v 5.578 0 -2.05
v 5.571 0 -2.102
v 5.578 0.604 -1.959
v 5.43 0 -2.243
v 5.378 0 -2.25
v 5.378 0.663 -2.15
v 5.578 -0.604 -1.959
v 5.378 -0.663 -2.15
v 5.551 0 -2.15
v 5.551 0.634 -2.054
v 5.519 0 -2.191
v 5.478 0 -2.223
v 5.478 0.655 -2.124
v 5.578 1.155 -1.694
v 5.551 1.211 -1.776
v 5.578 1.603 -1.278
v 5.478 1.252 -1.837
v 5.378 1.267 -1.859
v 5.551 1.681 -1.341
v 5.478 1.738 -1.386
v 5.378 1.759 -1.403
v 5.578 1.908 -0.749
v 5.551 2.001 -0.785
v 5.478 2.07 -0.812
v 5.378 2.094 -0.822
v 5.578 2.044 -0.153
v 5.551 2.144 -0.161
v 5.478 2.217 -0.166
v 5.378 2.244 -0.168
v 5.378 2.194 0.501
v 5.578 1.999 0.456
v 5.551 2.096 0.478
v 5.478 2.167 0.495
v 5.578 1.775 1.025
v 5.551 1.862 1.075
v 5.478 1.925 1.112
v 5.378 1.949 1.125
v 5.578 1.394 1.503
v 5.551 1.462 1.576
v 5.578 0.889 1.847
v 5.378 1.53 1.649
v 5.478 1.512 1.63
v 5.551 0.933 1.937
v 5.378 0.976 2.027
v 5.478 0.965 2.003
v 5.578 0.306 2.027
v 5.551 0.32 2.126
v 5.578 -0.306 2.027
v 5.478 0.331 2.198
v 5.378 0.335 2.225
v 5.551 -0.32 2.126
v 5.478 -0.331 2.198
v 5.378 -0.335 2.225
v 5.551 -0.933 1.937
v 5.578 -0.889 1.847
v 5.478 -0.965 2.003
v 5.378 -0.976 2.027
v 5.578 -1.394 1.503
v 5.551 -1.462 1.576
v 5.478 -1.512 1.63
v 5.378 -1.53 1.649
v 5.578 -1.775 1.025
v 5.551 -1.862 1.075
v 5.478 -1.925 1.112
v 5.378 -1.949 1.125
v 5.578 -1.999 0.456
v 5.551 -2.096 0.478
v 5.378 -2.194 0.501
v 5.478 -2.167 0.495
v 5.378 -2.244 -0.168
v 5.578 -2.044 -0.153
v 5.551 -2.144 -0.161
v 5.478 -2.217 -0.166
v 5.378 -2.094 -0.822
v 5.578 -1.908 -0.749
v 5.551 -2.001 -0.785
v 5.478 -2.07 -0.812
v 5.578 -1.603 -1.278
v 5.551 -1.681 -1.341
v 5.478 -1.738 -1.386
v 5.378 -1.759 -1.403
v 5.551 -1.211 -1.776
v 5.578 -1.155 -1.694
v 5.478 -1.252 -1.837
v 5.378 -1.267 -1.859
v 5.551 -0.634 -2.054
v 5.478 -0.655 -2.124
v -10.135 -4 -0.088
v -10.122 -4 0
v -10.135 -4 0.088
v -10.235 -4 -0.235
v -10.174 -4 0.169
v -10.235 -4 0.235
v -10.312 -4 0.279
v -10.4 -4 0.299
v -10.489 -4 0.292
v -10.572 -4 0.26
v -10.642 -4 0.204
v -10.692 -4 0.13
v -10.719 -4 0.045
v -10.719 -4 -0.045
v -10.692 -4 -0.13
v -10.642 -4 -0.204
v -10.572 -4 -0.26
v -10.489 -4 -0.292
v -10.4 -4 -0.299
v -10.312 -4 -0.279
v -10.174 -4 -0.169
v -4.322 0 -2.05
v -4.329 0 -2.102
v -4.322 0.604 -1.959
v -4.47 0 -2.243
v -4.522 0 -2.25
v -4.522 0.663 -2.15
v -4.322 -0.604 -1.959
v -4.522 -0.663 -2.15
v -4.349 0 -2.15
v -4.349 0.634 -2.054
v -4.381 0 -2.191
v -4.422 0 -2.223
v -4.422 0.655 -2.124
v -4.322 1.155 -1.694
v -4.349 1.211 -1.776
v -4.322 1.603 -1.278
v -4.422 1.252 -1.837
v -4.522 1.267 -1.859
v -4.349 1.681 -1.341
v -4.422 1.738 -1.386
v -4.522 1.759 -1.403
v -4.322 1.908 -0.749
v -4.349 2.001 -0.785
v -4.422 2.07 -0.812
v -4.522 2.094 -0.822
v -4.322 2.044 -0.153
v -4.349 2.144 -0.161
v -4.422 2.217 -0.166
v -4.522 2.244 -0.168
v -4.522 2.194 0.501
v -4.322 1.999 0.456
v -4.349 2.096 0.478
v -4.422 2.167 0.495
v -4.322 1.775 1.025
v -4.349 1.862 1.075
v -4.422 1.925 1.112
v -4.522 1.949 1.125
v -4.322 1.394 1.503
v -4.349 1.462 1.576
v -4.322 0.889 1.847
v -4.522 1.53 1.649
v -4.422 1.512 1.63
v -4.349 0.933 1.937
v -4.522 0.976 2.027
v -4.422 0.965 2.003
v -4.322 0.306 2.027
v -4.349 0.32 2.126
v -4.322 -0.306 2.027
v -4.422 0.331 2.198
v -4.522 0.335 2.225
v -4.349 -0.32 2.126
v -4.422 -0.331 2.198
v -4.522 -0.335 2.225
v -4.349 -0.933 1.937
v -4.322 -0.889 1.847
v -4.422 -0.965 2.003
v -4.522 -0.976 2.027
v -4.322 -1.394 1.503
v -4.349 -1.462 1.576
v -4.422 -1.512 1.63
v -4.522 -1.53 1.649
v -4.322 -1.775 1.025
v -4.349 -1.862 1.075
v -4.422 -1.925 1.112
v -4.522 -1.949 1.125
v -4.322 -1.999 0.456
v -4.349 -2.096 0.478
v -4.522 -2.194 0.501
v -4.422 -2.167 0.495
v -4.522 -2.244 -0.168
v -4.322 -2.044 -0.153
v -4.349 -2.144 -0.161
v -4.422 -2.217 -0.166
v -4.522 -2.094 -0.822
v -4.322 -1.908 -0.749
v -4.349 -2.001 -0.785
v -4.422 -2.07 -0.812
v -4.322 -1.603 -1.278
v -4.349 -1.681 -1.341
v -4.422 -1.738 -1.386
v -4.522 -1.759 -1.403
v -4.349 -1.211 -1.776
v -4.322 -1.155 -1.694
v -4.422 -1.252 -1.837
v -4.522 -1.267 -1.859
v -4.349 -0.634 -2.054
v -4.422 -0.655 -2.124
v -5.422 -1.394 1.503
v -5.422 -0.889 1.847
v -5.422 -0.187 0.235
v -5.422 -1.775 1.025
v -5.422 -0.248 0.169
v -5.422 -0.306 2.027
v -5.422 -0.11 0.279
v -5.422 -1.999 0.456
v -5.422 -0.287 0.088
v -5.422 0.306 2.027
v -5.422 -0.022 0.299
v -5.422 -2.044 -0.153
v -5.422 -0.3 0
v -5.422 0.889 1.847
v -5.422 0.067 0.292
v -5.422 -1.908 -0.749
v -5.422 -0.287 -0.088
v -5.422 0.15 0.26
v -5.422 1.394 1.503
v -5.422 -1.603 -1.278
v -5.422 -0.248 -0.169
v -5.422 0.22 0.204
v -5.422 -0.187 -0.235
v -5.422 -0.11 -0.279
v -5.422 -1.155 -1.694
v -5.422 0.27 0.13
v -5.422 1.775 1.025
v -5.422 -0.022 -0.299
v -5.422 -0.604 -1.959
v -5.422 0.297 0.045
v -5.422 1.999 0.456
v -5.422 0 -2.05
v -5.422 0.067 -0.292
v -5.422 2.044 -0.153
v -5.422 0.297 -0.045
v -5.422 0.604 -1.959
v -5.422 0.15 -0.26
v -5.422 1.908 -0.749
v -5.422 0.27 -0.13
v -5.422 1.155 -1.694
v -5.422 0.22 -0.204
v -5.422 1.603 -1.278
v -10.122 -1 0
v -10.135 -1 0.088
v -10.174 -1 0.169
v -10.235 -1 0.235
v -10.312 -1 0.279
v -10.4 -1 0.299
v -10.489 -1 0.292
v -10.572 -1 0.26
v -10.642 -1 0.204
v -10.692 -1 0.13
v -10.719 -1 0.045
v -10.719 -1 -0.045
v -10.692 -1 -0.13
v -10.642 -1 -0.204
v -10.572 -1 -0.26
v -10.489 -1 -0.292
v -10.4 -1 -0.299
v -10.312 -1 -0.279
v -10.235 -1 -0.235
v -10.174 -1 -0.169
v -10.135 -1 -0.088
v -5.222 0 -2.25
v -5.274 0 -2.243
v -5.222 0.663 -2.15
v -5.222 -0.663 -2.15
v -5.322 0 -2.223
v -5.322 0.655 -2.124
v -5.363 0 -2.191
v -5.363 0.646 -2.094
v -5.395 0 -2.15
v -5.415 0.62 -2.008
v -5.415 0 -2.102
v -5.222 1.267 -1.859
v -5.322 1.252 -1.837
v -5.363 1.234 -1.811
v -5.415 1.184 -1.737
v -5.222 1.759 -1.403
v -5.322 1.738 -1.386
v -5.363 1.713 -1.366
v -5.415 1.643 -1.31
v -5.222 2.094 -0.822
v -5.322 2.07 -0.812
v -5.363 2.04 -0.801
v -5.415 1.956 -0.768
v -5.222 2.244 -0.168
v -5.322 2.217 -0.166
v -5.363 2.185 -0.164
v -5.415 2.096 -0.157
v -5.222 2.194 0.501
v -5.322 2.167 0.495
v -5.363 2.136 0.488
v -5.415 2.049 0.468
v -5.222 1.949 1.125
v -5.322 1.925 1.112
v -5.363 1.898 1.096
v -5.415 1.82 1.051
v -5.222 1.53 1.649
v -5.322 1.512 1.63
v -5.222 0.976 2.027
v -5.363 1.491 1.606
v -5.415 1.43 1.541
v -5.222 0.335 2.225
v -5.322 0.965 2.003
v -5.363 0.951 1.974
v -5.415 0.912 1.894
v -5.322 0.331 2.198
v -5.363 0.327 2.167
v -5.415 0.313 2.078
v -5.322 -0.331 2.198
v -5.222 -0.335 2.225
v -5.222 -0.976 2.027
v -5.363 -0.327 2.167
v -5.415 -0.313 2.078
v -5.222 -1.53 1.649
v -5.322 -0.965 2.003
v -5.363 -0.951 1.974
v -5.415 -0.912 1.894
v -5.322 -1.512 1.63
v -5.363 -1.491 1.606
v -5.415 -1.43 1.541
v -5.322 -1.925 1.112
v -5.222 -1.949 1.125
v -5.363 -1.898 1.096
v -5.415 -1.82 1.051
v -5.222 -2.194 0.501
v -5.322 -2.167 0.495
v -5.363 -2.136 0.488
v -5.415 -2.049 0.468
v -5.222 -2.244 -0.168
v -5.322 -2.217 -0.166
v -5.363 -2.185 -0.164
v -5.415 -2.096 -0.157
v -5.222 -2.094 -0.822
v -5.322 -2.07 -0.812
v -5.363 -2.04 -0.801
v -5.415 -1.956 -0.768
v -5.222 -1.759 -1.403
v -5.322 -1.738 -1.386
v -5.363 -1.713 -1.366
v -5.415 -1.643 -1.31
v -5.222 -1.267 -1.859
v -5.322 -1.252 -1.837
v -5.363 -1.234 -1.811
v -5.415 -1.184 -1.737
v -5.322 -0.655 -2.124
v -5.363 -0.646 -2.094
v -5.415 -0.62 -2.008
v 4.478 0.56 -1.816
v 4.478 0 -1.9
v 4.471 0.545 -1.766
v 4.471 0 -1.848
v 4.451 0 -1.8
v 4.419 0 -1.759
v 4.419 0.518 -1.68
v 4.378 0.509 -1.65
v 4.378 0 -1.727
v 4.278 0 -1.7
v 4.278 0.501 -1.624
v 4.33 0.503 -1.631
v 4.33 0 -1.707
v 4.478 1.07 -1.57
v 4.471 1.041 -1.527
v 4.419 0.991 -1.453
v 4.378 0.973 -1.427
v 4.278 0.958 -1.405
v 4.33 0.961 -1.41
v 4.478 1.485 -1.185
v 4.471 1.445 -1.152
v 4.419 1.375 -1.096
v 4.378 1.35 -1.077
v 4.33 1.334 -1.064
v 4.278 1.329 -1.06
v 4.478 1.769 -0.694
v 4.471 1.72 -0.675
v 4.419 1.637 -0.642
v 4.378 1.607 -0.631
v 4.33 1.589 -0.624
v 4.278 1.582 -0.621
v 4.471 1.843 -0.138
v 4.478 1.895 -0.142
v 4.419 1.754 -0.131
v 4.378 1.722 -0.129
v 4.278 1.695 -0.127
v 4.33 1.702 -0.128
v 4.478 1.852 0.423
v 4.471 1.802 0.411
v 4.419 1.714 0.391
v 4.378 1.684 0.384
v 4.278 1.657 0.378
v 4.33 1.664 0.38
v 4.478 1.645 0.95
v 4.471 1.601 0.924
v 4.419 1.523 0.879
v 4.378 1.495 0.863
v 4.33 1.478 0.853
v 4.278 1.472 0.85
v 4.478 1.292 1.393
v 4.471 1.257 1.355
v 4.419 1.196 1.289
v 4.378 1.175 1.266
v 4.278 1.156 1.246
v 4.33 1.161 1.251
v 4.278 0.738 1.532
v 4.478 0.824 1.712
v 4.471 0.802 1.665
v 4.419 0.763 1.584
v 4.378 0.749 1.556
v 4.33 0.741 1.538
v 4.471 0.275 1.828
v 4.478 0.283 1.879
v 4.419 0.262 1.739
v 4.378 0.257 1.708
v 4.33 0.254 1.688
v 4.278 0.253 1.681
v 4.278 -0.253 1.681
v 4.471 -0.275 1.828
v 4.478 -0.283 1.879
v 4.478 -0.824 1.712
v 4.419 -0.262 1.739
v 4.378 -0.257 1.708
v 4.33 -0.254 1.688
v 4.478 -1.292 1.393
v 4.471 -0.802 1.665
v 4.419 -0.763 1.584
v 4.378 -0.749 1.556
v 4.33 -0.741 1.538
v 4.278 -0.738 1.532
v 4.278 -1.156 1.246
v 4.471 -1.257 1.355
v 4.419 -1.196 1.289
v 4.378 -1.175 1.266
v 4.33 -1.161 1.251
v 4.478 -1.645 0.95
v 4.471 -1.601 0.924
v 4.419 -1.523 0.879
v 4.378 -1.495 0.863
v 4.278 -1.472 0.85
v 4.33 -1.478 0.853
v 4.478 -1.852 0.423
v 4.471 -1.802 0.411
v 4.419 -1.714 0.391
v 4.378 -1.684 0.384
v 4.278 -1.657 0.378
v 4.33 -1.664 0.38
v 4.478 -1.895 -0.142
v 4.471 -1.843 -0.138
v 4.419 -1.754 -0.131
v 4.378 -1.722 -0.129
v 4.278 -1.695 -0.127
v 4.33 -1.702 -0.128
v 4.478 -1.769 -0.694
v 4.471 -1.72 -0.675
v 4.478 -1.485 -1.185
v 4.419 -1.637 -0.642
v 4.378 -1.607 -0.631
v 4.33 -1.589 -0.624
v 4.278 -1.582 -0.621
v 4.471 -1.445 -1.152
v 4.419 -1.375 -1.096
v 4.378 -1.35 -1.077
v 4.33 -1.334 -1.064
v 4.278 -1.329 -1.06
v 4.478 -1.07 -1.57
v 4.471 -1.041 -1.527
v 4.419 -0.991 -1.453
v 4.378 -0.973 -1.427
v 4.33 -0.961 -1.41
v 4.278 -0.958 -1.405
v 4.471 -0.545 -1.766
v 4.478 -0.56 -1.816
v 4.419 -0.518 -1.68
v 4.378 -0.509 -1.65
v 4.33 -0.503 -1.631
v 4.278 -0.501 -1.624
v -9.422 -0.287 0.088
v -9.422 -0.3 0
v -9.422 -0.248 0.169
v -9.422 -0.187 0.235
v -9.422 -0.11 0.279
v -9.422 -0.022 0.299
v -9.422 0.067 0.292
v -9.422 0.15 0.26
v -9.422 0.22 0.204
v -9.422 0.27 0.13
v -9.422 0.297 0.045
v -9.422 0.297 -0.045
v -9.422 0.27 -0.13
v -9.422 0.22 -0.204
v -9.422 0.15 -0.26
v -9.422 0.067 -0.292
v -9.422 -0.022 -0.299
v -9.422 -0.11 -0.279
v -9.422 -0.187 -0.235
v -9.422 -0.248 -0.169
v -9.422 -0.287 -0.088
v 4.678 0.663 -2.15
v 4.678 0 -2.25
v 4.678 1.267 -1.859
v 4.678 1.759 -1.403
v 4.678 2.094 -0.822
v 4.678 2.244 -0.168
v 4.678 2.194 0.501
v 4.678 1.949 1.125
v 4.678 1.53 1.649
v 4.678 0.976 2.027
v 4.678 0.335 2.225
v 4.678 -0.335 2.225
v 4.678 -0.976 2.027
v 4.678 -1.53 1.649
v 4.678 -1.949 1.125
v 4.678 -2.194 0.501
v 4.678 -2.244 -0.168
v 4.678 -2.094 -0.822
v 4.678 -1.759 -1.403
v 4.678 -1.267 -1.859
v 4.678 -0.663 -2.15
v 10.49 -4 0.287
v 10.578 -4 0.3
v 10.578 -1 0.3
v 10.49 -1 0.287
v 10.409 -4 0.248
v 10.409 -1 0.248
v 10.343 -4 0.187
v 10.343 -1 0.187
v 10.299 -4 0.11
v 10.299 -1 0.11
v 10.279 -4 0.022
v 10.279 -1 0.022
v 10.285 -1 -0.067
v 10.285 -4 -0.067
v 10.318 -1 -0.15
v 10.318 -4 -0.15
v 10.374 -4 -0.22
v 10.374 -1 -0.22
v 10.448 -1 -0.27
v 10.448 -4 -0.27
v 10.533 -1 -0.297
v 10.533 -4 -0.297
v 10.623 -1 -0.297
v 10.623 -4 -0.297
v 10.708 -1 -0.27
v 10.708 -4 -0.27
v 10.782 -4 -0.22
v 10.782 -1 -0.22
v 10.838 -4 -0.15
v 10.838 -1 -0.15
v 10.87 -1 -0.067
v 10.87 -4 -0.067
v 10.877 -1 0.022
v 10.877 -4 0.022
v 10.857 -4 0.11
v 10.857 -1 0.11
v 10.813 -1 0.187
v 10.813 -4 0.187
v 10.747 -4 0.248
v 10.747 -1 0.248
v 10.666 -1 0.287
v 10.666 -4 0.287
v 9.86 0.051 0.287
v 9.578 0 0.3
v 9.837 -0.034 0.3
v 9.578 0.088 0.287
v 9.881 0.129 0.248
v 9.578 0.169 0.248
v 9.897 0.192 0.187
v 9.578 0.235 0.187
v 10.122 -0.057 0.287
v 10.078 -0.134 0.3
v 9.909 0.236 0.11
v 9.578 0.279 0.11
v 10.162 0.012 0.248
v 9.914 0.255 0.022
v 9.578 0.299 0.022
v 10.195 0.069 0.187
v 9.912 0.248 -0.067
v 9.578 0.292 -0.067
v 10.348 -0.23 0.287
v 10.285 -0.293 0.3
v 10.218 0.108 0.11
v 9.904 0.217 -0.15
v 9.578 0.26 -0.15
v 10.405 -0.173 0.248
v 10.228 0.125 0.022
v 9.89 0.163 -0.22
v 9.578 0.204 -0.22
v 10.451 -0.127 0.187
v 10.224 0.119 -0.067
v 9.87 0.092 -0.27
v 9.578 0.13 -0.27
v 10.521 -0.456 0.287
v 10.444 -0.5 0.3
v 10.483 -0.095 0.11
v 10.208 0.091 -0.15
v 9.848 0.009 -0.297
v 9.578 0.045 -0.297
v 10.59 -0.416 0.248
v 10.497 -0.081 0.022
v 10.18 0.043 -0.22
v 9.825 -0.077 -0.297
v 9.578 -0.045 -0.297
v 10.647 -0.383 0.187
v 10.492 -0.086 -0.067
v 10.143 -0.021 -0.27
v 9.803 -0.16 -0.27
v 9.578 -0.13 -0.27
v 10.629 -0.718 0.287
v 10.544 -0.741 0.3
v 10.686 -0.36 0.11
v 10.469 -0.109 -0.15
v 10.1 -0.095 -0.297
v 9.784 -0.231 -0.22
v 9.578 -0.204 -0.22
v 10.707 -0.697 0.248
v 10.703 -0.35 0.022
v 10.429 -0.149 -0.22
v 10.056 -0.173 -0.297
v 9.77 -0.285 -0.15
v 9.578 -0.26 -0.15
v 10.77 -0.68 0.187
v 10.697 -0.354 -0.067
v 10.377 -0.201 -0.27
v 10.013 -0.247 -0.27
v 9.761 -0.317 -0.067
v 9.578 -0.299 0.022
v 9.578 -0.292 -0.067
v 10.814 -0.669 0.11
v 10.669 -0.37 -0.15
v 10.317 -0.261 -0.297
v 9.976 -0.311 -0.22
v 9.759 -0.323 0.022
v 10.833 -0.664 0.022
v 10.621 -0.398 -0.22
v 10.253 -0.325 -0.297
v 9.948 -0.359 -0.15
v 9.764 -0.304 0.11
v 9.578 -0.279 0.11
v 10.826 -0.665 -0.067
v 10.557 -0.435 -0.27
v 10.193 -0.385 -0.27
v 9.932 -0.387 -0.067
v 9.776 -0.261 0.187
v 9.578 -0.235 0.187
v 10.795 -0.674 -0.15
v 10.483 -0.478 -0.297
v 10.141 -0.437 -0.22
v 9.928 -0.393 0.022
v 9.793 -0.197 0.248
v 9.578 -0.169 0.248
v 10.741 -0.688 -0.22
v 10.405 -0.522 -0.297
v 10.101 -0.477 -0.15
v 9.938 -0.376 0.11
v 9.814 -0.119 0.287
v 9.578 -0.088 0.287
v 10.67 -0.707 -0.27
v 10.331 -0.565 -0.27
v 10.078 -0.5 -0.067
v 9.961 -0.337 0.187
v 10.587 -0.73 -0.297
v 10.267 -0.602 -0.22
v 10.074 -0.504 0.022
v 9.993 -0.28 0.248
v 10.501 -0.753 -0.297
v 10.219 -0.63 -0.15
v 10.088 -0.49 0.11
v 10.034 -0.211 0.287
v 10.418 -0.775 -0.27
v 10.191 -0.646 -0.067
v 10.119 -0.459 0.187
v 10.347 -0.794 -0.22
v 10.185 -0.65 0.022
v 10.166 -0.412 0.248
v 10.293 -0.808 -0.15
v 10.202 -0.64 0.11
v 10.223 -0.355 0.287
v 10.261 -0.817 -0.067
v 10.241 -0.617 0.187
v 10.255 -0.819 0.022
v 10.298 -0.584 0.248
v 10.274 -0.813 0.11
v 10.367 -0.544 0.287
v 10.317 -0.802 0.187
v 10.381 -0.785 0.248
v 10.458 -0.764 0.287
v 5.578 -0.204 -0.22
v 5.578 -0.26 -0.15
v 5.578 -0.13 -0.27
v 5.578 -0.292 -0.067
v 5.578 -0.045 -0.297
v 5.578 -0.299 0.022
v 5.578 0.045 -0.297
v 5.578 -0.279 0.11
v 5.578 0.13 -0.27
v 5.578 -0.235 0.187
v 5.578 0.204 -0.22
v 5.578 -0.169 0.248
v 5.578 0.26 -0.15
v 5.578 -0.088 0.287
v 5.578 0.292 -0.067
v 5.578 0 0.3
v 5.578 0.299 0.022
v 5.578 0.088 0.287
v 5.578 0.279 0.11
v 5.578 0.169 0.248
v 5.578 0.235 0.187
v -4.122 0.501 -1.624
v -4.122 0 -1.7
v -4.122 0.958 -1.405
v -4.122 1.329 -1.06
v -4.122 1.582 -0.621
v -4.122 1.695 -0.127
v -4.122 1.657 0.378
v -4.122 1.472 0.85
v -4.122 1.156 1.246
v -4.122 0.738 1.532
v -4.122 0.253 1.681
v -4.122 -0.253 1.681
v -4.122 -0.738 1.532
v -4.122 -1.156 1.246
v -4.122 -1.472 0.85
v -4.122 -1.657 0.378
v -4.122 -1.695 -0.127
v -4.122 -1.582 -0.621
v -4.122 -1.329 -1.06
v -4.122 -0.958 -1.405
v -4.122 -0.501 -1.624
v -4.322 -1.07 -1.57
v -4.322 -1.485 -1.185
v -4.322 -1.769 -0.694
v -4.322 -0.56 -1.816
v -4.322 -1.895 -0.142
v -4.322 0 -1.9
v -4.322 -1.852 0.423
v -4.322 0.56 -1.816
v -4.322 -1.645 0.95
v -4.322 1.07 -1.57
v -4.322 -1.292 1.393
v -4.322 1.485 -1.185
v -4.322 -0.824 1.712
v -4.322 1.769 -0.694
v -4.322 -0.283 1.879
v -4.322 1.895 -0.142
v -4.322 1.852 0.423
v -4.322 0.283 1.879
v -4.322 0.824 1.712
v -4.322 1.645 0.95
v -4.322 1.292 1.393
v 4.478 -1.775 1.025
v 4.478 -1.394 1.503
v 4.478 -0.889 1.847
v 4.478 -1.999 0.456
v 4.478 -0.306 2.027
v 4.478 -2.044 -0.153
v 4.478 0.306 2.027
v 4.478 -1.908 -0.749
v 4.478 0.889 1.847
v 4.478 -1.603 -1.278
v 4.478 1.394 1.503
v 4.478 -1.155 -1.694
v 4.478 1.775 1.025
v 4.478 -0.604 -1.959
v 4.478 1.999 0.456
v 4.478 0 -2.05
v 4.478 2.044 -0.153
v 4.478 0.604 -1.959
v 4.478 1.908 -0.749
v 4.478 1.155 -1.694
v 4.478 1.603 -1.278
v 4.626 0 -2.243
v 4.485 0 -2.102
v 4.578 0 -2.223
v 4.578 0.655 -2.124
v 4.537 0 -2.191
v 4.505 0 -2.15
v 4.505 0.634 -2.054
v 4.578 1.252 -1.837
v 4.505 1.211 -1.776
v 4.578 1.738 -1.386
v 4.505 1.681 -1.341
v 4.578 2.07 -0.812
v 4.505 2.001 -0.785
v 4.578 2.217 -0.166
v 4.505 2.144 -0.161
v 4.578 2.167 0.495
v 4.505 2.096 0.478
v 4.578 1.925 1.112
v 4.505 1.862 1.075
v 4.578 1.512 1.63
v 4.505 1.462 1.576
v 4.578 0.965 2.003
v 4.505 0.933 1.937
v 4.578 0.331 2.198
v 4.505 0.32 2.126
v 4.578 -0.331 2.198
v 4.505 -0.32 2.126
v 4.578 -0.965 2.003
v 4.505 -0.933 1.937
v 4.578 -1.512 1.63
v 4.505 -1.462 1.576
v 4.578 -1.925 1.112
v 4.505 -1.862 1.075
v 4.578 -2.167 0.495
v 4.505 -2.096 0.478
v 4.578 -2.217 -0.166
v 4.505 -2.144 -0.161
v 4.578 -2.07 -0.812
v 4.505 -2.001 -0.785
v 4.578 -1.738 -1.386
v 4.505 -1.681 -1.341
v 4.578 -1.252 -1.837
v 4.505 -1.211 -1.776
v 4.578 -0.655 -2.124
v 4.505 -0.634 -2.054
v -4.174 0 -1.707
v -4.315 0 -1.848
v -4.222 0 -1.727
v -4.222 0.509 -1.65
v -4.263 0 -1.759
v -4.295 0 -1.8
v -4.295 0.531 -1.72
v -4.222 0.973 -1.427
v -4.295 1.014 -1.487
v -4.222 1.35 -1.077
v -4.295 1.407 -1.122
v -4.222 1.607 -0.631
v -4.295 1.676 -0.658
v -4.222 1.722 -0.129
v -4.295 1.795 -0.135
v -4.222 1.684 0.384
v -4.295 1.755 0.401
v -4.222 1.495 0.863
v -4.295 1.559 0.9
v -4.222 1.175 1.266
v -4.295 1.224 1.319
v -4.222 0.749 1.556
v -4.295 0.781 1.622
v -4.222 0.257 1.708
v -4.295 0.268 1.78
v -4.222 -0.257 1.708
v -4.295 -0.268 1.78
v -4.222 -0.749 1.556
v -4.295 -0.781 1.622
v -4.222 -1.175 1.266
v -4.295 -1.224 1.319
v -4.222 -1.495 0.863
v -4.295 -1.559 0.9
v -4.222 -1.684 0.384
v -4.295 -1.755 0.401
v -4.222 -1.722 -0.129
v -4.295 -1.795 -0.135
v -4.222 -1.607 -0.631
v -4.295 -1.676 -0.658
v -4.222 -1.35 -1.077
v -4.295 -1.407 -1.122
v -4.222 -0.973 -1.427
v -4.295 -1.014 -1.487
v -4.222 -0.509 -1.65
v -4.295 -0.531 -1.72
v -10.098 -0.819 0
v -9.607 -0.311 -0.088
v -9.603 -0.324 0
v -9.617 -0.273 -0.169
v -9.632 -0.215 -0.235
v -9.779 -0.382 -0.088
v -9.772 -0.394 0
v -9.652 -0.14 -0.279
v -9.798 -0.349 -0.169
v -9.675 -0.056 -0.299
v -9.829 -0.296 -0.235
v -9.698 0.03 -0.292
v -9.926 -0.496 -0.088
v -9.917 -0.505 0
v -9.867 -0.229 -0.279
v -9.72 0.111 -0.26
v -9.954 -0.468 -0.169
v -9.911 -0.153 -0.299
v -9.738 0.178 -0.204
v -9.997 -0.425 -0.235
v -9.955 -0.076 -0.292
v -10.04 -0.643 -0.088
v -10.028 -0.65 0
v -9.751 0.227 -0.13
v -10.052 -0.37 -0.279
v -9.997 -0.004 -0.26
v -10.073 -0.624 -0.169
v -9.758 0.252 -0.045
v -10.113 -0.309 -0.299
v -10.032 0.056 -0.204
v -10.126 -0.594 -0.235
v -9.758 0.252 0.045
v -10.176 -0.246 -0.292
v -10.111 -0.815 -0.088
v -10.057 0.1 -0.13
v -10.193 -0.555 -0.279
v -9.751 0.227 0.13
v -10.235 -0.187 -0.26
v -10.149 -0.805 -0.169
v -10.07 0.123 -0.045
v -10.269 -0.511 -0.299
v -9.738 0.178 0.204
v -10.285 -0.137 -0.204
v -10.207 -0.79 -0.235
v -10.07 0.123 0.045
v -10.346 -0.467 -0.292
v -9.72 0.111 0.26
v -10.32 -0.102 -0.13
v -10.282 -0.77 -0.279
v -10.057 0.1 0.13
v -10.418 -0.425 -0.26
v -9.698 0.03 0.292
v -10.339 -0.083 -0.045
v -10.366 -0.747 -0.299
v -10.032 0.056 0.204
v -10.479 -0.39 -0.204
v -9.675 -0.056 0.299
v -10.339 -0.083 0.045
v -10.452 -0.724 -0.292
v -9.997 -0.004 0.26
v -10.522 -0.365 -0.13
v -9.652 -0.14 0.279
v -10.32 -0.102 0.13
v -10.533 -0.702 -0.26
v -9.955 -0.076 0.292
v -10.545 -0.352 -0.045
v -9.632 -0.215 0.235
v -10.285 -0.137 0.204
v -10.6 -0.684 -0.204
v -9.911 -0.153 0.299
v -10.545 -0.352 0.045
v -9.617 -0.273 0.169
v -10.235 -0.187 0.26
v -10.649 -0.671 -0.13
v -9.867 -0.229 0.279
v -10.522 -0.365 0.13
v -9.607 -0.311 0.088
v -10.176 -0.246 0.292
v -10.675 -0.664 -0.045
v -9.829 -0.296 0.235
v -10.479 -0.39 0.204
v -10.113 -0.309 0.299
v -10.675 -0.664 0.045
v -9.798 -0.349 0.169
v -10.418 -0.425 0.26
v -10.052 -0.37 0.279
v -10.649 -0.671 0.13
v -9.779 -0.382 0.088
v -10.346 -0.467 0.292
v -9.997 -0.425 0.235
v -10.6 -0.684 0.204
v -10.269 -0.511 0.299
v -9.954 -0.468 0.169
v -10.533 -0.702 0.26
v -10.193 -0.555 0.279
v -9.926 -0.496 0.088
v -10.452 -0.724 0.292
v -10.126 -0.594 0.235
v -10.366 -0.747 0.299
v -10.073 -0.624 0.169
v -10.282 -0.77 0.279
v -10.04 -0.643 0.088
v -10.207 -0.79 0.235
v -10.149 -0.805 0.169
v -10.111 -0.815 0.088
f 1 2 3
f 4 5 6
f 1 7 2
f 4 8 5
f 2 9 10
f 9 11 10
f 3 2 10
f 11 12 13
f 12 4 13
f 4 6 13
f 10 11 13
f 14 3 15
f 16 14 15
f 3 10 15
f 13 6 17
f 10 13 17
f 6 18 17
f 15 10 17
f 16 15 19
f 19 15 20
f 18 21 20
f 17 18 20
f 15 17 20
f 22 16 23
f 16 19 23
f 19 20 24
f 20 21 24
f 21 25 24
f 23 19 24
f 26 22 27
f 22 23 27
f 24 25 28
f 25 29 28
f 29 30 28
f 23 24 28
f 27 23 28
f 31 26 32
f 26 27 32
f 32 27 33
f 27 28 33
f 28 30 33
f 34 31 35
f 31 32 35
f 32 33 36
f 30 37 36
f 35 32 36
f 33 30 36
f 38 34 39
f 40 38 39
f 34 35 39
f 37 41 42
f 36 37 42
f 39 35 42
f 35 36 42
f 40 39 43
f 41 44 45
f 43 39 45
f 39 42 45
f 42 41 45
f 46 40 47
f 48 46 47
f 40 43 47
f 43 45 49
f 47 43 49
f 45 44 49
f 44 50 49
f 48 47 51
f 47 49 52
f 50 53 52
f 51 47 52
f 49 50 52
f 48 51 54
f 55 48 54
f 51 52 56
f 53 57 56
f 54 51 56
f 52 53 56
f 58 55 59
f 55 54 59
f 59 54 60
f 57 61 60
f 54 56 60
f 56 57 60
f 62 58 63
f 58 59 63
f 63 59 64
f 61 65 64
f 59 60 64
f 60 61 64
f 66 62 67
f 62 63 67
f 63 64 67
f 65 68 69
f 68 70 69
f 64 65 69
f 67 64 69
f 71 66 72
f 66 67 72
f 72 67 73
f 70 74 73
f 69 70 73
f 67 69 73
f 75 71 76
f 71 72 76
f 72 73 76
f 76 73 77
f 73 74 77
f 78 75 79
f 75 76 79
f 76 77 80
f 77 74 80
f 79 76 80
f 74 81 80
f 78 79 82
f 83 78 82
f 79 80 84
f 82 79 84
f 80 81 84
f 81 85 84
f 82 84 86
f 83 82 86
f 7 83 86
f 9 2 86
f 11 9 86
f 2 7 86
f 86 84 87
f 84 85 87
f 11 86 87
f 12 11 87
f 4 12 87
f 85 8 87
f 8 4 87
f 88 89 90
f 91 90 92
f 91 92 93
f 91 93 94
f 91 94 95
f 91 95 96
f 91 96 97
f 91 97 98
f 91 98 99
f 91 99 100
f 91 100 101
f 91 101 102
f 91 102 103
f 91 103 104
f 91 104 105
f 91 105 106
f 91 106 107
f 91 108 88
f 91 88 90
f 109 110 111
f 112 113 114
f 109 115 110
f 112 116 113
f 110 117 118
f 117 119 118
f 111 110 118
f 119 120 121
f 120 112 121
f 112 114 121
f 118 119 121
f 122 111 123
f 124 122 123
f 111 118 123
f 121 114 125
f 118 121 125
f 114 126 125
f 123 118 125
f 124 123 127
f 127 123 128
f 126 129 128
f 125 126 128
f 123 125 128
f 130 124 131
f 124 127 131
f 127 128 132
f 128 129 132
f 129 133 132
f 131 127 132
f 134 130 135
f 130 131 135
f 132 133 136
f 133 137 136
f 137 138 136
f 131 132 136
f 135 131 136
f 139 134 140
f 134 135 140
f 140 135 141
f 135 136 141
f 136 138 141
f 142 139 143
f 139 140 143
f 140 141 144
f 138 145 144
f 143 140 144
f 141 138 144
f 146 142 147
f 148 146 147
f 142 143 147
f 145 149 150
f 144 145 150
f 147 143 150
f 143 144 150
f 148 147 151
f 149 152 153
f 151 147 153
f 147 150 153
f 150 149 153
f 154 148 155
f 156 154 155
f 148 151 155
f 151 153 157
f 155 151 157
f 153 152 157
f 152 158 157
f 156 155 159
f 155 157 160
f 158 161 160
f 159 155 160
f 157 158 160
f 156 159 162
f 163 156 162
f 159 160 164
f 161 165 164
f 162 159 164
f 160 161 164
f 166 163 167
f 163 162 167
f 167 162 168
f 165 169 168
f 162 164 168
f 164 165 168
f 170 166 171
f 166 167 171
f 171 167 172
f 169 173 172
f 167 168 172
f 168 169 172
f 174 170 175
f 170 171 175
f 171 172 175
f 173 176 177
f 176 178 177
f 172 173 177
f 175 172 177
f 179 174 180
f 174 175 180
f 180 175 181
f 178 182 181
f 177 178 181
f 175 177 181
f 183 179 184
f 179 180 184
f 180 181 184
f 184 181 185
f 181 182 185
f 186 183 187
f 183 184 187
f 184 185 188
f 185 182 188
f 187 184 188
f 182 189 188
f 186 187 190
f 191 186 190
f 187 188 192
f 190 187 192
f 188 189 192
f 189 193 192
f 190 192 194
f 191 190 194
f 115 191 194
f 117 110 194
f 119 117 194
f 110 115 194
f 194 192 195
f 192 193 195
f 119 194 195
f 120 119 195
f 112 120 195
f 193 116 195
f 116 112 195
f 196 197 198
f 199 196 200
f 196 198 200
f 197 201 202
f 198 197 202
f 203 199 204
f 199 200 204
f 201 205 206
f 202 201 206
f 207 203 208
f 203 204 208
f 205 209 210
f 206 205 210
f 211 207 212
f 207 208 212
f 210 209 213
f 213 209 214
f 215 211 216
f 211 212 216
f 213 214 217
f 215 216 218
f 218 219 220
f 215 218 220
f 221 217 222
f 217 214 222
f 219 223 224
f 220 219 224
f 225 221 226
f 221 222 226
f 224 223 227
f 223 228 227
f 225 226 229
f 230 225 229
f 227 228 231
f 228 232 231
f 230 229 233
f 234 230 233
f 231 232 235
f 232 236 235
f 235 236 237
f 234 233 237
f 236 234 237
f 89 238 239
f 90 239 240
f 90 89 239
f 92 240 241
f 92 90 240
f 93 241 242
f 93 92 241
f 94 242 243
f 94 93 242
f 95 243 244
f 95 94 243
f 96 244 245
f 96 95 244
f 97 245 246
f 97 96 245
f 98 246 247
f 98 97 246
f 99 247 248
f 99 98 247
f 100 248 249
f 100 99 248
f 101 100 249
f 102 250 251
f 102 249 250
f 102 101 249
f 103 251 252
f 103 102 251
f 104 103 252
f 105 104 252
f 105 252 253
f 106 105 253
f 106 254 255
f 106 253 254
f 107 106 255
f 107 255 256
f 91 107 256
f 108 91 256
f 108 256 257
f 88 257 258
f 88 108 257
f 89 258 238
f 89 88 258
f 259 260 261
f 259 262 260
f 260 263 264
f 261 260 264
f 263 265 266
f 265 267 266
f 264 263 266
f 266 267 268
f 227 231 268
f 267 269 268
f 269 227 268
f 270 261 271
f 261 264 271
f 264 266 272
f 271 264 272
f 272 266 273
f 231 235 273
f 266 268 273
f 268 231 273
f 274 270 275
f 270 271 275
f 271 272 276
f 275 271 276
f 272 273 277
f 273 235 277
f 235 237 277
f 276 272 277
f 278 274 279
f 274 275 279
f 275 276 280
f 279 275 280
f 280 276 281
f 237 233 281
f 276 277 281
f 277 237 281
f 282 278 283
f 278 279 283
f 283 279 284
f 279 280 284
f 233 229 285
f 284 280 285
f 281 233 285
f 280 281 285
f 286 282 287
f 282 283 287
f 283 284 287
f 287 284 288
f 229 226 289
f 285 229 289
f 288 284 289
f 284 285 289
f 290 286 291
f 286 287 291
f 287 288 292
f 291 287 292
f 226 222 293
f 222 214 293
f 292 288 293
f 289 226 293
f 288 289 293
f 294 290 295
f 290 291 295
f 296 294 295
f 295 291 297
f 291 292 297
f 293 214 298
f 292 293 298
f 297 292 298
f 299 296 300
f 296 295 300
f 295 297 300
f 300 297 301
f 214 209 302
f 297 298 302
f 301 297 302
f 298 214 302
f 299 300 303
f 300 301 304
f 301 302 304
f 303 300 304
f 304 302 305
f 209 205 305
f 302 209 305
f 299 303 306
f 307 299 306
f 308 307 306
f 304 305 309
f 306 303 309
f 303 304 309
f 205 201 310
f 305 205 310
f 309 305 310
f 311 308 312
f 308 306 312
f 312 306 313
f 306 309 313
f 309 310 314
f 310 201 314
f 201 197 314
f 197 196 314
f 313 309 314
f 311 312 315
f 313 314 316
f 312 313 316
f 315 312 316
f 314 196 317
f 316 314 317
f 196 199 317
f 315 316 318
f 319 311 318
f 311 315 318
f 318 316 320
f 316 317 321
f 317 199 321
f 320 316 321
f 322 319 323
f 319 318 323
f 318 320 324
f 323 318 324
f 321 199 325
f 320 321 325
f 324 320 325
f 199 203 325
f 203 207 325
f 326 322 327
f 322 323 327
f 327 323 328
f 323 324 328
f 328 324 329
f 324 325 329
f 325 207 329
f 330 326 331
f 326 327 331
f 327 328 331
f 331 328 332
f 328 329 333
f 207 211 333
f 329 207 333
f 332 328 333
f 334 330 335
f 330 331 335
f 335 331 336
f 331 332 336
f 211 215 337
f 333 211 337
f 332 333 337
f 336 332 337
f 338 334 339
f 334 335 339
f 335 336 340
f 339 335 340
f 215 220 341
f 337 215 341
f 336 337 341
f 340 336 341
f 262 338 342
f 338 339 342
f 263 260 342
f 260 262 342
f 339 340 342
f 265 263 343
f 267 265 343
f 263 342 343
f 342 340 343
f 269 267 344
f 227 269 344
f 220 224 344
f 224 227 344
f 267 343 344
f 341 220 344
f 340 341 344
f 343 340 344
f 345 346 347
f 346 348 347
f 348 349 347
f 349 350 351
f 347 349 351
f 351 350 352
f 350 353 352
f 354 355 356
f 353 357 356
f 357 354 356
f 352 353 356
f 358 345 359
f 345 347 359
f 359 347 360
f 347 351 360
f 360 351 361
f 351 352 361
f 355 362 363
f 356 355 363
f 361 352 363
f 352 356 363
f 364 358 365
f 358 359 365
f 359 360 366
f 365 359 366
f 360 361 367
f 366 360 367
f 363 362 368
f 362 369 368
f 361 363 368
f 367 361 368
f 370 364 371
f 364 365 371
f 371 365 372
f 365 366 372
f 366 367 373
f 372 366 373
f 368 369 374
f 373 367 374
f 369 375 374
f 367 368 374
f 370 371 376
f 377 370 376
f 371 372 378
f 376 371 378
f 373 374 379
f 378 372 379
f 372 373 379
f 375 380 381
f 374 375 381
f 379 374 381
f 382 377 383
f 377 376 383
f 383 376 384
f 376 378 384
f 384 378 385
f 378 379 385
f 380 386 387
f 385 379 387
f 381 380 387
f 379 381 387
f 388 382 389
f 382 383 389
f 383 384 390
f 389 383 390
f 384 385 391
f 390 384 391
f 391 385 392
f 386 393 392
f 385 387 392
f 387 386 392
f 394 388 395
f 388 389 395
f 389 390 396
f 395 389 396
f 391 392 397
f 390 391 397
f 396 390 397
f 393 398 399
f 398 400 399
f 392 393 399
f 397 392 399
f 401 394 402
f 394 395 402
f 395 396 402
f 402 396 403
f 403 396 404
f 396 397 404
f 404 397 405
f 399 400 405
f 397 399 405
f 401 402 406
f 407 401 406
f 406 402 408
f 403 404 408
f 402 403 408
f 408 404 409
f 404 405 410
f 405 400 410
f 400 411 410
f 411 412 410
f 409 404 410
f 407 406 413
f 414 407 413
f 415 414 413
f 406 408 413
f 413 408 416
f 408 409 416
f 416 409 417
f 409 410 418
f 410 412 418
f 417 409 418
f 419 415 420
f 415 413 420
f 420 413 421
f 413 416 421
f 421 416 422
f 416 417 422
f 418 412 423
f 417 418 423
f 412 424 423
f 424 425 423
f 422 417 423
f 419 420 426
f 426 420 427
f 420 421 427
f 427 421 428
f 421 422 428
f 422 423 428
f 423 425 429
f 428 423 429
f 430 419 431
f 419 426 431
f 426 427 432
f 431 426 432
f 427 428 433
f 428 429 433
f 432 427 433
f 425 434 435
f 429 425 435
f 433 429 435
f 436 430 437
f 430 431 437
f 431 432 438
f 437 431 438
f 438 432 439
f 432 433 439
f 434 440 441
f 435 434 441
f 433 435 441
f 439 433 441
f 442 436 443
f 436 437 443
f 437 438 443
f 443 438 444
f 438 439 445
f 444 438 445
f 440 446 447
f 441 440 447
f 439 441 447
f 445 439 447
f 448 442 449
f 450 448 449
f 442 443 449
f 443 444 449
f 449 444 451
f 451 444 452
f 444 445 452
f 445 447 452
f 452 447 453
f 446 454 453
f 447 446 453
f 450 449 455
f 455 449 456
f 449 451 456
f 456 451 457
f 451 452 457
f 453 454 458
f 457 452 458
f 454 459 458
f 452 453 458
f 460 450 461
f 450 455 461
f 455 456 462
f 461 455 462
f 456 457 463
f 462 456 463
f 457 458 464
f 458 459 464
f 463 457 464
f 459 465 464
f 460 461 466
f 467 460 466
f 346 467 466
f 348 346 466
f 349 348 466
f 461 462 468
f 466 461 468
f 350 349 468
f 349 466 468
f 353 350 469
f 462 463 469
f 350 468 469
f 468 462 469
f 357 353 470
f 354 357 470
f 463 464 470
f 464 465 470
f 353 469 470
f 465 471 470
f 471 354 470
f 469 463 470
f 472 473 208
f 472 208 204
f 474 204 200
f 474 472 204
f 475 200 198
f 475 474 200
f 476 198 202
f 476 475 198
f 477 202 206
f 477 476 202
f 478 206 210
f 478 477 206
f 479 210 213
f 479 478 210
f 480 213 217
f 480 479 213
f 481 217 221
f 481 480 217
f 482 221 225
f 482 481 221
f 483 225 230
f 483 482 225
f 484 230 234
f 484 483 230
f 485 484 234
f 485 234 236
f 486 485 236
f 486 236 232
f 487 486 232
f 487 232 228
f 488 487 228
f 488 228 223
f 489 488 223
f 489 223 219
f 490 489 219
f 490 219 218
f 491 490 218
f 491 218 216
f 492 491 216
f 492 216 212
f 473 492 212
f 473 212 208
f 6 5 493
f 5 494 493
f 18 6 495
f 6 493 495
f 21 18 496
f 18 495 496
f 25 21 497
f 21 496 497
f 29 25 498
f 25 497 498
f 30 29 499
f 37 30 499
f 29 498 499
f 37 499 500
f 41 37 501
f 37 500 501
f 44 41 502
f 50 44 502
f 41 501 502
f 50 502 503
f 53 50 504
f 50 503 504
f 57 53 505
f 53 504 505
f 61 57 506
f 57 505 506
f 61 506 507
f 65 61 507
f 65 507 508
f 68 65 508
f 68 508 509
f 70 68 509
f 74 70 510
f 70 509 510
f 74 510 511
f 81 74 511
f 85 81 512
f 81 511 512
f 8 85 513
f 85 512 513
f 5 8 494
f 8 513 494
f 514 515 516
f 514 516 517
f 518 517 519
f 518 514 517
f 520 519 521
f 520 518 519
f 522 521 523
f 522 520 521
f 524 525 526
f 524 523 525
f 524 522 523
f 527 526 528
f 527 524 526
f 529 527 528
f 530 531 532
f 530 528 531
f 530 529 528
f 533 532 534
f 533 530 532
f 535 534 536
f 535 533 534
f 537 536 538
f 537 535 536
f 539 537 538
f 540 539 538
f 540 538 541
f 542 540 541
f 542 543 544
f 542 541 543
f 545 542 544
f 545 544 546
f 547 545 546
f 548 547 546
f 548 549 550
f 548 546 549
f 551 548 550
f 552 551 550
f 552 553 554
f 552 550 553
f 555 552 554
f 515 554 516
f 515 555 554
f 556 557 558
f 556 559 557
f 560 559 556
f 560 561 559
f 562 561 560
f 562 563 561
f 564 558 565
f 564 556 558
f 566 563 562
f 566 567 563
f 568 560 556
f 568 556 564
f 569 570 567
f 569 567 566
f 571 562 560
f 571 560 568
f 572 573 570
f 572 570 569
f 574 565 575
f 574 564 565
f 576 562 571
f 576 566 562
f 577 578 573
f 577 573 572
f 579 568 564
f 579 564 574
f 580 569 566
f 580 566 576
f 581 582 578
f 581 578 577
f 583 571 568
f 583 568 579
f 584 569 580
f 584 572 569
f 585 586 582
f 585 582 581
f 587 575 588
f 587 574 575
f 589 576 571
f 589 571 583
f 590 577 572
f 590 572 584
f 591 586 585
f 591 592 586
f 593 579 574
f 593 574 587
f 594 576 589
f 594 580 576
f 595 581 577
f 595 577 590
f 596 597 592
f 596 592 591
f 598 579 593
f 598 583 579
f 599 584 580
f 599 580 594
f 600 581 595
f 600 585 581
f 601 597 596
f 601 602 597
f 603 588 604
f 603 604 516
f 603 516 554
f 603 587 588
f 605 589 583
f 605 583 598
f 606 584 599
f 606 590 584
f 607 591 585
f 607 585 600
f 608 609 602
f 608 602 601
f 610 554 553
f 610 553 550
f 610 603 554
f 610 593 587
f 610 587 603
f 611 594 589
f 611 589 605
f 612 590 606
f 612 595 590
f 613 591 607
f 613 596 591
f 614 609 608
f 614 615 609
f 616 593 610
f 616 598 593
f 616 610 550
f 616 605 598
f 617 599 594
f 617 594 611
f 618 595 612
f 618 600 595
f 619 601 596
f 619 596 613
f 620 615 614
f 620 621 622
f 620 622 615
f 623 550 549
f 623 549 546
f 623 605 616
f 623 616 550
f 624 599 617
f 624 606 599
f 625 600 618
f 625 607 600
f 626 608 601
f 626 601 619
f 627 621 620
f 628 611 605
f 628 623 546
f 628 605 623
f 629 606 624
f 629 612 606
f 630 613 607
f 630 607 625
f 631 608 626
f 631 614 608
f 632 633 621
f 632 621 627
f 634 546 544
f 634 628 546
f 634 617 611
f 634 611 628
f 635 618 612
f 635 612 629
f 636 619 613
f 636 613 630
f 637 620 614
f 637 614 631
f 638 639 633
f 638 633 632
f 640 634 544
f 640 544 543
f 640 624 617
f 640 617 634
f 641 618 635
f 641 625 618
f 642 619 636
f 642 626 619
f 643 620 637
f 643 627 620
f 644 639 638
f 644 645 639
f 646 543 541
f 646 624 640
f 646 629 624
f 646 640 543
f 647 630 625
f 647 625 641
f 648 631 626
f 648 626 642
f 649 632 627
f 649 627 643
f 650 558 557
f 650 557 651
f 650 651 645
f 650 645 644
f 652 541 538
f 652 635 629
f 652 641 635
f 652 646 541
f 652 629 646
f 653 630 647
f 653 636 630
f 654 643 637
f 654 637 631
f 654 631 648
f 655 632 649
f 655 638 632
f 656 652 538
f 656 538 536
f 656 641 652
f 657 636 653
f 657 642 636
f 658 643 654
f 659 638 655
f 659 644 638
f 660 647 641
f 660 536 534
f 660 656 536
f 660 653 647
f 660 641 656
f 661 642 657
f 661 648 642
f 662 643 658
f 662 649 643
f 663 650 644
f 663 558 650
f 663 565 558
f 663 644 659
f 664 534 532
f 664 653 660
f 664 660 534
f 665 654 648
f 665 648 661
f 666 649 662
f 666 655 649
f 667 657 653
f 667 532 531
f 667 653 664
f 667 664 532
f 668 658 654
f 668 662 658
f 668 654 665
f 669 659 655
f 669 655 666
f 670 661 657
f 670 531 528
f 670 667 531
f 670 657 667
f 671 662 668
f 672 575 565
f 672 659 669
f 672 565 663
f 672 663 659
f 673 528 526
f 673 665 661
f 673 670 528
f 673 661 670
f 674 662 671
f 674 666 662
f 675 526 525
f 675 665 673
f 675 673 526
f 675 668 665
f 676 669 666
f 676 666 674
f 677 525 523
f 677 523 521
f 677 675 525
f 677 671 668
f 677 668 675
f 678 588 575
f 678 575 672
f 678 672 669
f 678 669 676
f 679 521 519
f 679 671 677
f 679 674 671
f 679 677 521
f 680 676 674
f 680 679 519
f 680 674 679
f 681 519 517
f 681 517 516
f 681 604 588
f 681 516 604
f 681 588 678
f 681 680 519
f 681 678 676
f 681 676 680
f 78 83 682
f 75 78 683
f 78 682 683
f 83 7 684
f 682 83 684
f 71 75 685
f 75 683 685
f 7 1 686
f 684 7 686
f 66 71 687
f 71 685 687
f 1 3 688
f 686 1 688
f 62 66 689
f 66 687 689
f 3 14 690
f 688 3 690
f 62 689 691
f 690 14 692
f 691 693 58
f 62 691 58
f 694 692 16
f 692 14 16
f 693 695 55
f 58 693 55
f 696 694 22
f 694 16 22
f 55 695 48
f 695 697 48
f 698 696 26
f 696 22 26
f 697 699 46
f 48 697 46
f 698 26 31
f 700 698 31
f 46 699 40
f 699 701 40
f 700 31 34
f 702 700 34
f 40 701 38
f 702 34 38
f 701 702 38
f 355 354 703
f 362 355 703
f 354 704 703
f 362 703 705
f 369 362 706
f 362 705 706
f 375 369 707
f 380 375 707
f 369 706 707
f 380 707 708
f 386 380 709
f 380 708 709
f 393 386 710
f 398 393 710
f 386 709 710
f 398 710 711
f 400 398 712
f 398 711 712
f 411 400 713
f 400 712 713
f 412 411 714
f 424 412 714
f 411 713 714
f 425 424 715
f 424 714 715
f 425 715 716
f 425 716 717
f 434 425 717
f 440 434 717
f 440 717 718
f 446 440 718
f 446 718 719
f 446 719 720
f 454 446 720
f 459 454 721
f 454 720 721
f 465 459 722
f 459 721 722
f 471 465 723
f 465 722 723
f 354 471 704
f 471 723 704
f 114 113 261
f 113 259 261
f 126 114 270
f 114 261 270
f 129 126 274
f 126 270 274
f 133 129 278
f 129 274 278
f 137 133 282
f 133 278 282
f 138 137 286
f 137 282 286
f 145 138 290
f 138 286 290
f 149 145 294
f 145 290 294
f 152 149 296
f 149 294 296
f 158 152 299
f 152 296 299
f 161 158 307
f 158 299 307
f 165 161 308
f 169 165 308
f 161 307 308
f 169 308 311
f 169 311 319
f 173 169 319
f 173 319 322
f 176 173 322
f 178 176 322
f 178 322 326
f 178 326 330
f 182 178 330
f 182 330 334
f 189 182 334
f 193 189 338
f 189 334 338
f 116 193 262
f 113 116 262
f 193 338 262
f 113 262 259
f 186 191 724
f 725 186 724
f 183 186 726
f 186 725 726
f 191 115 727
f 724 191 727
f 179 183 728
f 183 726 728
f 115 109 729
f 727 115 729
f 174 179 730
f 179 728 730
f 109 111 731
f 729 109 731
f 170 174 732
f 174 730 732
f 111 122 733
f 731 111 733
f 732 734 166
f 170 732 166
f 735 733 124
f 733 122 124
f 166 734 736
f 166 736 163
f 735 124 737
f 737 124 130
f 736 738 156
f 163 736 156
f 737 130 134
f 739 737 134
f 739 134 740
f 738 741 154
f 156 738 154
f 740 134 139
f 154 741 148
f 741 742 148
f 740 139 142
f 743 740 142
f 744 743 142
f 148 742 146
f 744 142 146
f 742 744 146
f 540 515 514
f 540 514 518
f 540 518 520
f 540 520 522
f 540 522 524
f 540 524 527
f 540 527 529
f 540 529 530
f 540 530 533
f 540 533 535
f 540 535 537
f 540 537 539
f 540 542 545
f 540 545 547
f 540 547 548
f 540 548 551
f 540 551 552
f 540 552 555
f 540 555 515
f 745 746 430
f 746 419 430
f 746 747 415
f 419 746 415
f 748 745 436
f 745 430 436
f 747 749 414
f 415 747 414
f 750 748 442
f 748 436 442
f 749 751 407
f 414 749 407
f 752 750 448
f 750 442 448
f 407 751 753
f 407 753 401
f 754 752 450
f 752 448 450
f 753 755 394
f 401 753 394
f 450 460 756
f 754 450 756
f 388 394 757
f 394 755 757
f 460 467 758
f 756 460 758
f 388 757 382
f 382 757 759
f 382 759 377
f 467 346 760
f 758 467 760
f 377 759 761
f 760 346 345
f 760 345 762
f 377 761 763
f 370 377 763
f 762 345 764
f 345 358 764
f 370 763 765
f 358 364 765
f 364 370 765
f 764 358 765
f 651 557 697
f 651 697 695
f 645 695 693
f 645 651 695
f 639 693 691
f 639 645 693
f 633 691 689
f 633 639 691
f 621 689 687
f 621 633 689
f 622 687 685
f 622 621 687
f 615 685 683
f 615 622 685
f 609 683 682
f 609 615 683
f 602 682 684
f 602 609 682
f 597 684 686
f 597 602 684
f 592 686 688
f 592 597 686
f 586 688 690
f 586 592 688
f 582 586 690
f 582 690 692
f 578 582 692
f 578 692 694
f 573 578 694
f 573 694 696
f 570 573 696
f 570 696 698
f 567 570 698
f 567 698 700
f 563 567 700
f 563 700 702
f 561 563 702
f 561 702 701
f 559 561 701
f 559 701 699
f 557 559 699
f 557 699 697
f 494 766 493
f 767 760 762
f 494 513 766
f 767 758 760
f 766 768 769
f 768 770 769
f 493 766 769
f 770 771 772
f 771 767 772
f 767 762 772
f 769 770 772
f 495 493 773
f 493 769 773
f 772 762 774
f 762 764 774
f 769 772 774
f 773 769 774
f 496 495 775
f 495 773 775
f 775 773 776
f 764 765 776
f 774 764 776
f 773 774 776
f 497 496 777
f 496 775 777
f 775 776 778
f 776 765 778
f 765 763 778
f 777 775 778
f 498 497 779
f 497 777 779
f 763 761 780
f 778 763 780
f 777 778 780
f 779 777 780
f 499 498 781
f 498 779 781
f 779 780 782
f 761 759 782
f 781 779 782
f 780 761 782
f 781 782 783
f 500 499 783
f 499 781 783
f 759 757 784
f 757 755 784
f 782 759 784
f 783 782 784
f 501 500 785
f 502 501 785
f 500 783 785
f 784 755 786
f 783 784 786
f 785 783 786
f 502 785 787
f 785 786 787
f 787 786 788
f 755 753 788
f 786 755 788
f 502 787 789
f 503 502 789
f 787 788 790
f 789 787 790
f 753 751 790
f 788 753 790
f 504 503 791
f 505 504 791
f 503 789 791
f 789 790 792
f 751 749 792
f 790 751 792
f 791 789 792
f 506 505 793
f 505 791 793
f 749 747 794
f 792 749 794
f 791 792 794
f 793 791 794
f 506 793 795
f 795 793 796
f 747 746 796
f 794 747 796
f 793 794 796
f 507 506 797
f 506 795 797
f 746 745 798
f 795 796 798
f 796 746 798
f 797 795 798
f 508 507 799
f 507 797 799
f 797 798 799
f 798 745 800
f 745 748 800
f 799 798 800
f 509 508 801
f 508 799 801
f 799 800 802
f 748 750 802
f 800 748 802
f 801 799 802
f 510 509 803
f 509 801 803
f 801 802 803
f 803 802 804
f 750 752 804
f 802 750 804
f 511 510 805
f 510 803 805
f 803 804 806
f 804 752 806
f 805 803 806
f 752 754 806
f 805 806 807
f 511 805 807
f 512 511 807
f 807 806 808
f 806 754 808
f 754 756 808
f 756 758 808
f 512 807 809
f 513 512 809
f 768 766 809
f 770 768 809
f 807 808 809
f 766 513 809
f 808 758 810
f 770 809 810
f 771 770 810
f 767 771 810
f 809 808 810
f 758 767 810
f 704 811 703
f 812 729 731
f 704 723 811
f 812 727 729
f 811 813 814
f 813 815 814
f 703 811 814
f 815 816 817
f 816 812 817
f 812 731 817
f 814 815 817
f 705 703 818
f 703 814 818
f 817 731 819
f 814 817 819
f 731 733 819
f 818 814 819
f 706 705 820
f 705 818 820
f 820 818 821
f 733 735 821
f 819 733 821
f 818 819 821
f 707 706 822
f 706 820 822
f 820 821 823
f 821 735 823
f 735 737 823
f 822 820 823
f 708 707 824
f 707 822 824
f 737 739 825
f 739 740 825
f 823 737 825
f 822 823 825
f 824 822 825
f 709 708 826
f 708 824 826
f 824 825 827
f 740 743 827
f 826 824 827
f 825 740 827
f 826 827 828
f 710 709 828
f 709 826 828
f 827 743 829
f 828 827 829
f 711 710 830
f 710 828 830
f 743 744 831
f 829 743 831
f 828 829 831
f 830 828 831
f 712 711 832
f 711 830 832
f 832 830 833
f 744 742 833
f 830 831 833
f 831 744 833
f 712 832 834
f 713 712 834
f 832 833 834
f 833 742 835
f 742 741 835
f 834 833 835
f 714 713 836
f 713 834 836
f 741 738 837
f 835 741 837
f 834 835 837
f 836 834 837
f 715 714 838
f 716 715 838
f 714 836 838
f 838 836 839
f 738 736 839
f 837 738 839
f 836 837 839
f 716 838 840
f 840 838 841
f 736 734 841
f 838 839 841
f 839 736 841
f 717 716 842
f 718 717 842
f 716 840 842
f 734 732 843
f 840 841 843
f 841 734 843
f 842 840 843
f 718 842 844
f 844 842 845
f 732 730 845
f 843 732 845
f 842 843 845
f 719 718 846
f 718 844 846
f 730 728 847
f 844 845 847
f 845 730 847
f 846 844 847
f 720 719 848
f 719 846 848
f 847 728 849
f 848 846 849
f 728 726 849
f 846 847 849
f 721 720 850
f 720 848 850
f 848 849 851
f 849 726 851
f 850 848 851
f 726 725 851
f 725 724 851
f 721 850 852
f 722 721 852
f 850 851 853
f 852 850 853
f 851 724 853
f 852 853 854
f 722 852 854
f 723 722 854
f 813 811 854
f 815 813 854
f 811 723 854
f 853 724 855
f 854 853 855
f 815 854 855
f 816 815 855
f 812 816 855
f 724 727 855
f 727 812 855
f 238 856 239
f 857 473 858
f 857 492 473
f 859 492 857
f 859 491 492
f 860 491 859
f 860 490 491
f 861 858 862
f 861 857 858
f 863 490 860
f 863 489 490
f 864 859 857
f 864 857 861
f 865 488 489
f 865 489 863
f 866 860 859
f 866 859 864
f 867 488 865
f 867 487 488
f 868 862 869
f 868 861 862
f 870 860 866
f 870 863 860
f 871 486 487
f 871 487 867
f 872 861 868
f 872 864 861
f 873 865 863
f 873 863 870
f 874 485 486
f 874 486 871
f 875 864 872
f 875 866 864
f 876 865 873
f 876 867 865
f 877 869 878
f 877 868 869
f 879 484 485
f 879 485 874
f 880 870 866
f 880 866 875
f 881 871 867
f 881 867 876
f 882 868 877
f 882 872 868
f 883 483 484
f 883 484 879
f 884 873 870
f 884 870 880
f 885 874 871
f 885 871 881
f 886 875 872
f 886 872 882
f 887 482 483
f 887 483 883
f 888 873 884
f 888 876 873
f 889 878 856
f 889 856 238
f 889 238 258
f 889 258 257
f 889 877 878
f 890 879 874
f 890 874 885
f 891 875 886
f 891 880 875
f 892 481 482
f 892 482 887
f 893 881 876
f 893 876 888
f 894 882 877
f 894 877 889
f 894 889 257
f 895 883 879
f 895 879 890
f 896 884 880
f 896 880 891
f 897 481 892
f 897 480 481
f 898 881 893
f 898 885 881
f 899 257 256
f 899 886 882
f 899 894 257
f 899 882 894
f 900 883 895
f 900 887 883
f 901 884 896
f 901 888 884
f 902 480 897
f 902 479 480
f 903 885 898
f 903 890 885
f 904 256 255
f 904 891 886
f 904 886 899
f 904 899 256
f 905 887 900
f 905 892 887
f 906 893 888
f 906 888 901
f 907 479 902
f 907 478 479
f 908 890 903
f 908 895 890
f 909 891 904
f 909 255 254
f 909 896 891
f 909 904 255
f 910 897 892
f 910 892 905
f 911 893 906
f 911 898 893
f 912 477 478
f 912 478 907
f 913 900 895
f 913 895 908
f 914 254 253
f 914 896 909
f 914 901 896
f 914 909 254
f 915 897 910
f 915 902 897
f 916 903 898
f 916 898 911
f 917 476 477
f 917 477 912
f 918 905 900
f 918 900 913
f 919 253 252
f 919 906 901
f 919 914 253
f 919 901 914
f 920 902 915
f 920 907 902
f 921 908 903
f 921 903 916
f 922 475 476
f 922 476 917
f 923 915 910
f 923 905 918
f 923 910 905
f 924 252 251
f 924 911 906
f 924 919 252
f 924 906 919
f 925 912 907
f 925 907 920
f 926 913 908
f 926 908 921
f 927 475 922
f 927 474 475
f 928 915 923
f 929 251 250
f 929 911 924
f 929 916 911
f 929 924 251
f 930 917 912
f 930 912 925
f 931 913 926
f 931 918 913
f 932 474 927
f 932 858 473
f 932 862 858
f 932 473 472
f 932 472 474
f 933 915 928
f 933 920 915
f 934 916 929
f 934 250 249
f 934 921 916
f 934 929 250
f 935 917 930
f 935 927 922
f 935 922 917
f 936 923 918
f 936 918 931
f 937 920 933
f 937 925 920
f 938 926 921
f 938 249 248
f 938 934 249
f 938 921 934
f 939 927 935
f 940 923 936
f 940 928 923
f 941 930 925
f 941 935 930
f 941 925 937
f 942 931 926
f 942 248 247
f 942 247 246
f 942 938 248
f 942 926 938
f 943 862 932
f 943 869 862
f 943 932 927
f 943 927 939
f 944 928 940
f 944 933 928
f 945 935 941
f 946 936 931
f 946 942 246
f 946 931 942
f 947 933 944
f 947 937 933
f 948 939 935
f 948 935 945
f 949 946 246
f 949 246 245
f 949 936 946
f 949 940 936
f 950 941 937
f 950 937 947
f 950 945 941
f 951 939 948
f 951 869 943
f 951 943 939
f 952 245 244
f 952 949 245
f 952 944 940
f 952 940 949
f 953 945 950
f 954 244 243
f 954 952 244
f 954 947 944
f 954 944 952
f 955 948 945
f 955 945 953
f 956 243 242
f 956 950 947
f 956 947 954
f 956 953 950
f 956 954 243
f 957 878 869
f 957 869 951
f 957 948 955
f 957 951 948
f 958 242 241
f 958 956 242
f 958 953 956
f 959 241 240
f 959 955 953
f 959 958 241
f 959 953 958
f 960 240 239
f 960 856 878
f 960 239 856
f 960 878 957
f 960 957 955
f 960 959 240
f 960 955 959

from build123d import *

# Parameters (mm, degrees)
SWEEP_4_PROFILE_R = 0.3
SWEEP_5_PROFILE_R = 0.3


with BuildPart() as part:
    # Эскиз2 → Повернуть7 (revolve)
    with BuildSketch(Plane(origin=(0, 0, 0), x_dir=(1, 0, 0), z_dir=(0, 1, 0))):
        with BuildLine():
            Line((-5.422047244, 0), (5.577952756, 0))
            Line((5.577952756, 0), (5.577952756, 2.05))
            ThreePointArc((5.577952756, 2.05), (5.519374112, 2.191421356), (5.377952756, 2.25))
            Line((5.377952756, 2.25), (4.677952756, 2.25))
            ThreePointArc((4.677952756, 2.25), (4.5365314, 2.191421356), (4.477952756, 2.05))
            Line((4.477952756, 2.05), (4.477952756, 1.9))
            ThreePointArc((4.477952756, 1.9), (4.419374112, 1.758578644), (4.277952756, 1.7))
            Line((4.277952756, 1.7), (-4.122047244, 1.7))
            ThreePointArc((-4.122047244, 1.7), (-4.2634686, 1.758578644), (-4.322047244, 1.9))
            Line((-4.322047244, 1.9), (-4.322047244, 2.05))
            ThreePointArc((-4.322047244, 2.05), (-4.380625888, 2.191421356), (-4.522047244, 2.25))
            Line((-4.522047244, 2.25), (-5.222047244, 2.25))
            ThreePointArc((-5.222047244, 2.25), (-5.3634686, 2.191421356), (-5.422047244, 2.05))
            Line((-5.422047244, 2.05), (-5.422047244, 0))
        make_face()
    revolve(axis=Axis((-5.422047244, 0, 0), (1, 0, 0)))

    # По траектории4: sweep along a path in Эскиз47
    with BuildLine(Plane.XY) as sweep_4_path:
        Line((-5.422047244, 0), (-9.422047244, 0))
        ThreePointArc((-9.422047244, 0), (-10.129154025, -0.292893219), (-10.422047244, -1))
        Line((-10.422047244, -1), (-10.422047244, -4))
    # По траектории4 profile (on start of the path) → По траектории4 (sweep)
    with BuildSketch(Plane(origin=(-5.422047244, 0, 0), x_dir=(0, -1, 0), z_dir=(-1, 0, 0))):
        Circle(SWEEP_4_PROFILE_R)
    sweep(path=sweep_4_path.line)

    # По траектории5: sweep along a path in Эскиз92
    with BuildLine(Plane.XY) as sweep_5_path:
        Line((5.577952756, 0), (9.577952756, 0))
        ThreePointArc((9.577952756, 0), (10.285059537, -0.292893219), (10.577952756, -1))
        Line((10.577952756, -1), (10.577952756, -4))
    # По траектории5 profile (on start of the path) → По траектории5 (sweep)
    with BuildSketch(Plane(origin=(5.577952756, 0, 0), x_dir=(0, 0, 1), z_dir=(1, 0, 0))):
        Circle(SWEEP_5_PROFILE_R)
    sweep(path=sweep_5_path.line)


solid = part.part
